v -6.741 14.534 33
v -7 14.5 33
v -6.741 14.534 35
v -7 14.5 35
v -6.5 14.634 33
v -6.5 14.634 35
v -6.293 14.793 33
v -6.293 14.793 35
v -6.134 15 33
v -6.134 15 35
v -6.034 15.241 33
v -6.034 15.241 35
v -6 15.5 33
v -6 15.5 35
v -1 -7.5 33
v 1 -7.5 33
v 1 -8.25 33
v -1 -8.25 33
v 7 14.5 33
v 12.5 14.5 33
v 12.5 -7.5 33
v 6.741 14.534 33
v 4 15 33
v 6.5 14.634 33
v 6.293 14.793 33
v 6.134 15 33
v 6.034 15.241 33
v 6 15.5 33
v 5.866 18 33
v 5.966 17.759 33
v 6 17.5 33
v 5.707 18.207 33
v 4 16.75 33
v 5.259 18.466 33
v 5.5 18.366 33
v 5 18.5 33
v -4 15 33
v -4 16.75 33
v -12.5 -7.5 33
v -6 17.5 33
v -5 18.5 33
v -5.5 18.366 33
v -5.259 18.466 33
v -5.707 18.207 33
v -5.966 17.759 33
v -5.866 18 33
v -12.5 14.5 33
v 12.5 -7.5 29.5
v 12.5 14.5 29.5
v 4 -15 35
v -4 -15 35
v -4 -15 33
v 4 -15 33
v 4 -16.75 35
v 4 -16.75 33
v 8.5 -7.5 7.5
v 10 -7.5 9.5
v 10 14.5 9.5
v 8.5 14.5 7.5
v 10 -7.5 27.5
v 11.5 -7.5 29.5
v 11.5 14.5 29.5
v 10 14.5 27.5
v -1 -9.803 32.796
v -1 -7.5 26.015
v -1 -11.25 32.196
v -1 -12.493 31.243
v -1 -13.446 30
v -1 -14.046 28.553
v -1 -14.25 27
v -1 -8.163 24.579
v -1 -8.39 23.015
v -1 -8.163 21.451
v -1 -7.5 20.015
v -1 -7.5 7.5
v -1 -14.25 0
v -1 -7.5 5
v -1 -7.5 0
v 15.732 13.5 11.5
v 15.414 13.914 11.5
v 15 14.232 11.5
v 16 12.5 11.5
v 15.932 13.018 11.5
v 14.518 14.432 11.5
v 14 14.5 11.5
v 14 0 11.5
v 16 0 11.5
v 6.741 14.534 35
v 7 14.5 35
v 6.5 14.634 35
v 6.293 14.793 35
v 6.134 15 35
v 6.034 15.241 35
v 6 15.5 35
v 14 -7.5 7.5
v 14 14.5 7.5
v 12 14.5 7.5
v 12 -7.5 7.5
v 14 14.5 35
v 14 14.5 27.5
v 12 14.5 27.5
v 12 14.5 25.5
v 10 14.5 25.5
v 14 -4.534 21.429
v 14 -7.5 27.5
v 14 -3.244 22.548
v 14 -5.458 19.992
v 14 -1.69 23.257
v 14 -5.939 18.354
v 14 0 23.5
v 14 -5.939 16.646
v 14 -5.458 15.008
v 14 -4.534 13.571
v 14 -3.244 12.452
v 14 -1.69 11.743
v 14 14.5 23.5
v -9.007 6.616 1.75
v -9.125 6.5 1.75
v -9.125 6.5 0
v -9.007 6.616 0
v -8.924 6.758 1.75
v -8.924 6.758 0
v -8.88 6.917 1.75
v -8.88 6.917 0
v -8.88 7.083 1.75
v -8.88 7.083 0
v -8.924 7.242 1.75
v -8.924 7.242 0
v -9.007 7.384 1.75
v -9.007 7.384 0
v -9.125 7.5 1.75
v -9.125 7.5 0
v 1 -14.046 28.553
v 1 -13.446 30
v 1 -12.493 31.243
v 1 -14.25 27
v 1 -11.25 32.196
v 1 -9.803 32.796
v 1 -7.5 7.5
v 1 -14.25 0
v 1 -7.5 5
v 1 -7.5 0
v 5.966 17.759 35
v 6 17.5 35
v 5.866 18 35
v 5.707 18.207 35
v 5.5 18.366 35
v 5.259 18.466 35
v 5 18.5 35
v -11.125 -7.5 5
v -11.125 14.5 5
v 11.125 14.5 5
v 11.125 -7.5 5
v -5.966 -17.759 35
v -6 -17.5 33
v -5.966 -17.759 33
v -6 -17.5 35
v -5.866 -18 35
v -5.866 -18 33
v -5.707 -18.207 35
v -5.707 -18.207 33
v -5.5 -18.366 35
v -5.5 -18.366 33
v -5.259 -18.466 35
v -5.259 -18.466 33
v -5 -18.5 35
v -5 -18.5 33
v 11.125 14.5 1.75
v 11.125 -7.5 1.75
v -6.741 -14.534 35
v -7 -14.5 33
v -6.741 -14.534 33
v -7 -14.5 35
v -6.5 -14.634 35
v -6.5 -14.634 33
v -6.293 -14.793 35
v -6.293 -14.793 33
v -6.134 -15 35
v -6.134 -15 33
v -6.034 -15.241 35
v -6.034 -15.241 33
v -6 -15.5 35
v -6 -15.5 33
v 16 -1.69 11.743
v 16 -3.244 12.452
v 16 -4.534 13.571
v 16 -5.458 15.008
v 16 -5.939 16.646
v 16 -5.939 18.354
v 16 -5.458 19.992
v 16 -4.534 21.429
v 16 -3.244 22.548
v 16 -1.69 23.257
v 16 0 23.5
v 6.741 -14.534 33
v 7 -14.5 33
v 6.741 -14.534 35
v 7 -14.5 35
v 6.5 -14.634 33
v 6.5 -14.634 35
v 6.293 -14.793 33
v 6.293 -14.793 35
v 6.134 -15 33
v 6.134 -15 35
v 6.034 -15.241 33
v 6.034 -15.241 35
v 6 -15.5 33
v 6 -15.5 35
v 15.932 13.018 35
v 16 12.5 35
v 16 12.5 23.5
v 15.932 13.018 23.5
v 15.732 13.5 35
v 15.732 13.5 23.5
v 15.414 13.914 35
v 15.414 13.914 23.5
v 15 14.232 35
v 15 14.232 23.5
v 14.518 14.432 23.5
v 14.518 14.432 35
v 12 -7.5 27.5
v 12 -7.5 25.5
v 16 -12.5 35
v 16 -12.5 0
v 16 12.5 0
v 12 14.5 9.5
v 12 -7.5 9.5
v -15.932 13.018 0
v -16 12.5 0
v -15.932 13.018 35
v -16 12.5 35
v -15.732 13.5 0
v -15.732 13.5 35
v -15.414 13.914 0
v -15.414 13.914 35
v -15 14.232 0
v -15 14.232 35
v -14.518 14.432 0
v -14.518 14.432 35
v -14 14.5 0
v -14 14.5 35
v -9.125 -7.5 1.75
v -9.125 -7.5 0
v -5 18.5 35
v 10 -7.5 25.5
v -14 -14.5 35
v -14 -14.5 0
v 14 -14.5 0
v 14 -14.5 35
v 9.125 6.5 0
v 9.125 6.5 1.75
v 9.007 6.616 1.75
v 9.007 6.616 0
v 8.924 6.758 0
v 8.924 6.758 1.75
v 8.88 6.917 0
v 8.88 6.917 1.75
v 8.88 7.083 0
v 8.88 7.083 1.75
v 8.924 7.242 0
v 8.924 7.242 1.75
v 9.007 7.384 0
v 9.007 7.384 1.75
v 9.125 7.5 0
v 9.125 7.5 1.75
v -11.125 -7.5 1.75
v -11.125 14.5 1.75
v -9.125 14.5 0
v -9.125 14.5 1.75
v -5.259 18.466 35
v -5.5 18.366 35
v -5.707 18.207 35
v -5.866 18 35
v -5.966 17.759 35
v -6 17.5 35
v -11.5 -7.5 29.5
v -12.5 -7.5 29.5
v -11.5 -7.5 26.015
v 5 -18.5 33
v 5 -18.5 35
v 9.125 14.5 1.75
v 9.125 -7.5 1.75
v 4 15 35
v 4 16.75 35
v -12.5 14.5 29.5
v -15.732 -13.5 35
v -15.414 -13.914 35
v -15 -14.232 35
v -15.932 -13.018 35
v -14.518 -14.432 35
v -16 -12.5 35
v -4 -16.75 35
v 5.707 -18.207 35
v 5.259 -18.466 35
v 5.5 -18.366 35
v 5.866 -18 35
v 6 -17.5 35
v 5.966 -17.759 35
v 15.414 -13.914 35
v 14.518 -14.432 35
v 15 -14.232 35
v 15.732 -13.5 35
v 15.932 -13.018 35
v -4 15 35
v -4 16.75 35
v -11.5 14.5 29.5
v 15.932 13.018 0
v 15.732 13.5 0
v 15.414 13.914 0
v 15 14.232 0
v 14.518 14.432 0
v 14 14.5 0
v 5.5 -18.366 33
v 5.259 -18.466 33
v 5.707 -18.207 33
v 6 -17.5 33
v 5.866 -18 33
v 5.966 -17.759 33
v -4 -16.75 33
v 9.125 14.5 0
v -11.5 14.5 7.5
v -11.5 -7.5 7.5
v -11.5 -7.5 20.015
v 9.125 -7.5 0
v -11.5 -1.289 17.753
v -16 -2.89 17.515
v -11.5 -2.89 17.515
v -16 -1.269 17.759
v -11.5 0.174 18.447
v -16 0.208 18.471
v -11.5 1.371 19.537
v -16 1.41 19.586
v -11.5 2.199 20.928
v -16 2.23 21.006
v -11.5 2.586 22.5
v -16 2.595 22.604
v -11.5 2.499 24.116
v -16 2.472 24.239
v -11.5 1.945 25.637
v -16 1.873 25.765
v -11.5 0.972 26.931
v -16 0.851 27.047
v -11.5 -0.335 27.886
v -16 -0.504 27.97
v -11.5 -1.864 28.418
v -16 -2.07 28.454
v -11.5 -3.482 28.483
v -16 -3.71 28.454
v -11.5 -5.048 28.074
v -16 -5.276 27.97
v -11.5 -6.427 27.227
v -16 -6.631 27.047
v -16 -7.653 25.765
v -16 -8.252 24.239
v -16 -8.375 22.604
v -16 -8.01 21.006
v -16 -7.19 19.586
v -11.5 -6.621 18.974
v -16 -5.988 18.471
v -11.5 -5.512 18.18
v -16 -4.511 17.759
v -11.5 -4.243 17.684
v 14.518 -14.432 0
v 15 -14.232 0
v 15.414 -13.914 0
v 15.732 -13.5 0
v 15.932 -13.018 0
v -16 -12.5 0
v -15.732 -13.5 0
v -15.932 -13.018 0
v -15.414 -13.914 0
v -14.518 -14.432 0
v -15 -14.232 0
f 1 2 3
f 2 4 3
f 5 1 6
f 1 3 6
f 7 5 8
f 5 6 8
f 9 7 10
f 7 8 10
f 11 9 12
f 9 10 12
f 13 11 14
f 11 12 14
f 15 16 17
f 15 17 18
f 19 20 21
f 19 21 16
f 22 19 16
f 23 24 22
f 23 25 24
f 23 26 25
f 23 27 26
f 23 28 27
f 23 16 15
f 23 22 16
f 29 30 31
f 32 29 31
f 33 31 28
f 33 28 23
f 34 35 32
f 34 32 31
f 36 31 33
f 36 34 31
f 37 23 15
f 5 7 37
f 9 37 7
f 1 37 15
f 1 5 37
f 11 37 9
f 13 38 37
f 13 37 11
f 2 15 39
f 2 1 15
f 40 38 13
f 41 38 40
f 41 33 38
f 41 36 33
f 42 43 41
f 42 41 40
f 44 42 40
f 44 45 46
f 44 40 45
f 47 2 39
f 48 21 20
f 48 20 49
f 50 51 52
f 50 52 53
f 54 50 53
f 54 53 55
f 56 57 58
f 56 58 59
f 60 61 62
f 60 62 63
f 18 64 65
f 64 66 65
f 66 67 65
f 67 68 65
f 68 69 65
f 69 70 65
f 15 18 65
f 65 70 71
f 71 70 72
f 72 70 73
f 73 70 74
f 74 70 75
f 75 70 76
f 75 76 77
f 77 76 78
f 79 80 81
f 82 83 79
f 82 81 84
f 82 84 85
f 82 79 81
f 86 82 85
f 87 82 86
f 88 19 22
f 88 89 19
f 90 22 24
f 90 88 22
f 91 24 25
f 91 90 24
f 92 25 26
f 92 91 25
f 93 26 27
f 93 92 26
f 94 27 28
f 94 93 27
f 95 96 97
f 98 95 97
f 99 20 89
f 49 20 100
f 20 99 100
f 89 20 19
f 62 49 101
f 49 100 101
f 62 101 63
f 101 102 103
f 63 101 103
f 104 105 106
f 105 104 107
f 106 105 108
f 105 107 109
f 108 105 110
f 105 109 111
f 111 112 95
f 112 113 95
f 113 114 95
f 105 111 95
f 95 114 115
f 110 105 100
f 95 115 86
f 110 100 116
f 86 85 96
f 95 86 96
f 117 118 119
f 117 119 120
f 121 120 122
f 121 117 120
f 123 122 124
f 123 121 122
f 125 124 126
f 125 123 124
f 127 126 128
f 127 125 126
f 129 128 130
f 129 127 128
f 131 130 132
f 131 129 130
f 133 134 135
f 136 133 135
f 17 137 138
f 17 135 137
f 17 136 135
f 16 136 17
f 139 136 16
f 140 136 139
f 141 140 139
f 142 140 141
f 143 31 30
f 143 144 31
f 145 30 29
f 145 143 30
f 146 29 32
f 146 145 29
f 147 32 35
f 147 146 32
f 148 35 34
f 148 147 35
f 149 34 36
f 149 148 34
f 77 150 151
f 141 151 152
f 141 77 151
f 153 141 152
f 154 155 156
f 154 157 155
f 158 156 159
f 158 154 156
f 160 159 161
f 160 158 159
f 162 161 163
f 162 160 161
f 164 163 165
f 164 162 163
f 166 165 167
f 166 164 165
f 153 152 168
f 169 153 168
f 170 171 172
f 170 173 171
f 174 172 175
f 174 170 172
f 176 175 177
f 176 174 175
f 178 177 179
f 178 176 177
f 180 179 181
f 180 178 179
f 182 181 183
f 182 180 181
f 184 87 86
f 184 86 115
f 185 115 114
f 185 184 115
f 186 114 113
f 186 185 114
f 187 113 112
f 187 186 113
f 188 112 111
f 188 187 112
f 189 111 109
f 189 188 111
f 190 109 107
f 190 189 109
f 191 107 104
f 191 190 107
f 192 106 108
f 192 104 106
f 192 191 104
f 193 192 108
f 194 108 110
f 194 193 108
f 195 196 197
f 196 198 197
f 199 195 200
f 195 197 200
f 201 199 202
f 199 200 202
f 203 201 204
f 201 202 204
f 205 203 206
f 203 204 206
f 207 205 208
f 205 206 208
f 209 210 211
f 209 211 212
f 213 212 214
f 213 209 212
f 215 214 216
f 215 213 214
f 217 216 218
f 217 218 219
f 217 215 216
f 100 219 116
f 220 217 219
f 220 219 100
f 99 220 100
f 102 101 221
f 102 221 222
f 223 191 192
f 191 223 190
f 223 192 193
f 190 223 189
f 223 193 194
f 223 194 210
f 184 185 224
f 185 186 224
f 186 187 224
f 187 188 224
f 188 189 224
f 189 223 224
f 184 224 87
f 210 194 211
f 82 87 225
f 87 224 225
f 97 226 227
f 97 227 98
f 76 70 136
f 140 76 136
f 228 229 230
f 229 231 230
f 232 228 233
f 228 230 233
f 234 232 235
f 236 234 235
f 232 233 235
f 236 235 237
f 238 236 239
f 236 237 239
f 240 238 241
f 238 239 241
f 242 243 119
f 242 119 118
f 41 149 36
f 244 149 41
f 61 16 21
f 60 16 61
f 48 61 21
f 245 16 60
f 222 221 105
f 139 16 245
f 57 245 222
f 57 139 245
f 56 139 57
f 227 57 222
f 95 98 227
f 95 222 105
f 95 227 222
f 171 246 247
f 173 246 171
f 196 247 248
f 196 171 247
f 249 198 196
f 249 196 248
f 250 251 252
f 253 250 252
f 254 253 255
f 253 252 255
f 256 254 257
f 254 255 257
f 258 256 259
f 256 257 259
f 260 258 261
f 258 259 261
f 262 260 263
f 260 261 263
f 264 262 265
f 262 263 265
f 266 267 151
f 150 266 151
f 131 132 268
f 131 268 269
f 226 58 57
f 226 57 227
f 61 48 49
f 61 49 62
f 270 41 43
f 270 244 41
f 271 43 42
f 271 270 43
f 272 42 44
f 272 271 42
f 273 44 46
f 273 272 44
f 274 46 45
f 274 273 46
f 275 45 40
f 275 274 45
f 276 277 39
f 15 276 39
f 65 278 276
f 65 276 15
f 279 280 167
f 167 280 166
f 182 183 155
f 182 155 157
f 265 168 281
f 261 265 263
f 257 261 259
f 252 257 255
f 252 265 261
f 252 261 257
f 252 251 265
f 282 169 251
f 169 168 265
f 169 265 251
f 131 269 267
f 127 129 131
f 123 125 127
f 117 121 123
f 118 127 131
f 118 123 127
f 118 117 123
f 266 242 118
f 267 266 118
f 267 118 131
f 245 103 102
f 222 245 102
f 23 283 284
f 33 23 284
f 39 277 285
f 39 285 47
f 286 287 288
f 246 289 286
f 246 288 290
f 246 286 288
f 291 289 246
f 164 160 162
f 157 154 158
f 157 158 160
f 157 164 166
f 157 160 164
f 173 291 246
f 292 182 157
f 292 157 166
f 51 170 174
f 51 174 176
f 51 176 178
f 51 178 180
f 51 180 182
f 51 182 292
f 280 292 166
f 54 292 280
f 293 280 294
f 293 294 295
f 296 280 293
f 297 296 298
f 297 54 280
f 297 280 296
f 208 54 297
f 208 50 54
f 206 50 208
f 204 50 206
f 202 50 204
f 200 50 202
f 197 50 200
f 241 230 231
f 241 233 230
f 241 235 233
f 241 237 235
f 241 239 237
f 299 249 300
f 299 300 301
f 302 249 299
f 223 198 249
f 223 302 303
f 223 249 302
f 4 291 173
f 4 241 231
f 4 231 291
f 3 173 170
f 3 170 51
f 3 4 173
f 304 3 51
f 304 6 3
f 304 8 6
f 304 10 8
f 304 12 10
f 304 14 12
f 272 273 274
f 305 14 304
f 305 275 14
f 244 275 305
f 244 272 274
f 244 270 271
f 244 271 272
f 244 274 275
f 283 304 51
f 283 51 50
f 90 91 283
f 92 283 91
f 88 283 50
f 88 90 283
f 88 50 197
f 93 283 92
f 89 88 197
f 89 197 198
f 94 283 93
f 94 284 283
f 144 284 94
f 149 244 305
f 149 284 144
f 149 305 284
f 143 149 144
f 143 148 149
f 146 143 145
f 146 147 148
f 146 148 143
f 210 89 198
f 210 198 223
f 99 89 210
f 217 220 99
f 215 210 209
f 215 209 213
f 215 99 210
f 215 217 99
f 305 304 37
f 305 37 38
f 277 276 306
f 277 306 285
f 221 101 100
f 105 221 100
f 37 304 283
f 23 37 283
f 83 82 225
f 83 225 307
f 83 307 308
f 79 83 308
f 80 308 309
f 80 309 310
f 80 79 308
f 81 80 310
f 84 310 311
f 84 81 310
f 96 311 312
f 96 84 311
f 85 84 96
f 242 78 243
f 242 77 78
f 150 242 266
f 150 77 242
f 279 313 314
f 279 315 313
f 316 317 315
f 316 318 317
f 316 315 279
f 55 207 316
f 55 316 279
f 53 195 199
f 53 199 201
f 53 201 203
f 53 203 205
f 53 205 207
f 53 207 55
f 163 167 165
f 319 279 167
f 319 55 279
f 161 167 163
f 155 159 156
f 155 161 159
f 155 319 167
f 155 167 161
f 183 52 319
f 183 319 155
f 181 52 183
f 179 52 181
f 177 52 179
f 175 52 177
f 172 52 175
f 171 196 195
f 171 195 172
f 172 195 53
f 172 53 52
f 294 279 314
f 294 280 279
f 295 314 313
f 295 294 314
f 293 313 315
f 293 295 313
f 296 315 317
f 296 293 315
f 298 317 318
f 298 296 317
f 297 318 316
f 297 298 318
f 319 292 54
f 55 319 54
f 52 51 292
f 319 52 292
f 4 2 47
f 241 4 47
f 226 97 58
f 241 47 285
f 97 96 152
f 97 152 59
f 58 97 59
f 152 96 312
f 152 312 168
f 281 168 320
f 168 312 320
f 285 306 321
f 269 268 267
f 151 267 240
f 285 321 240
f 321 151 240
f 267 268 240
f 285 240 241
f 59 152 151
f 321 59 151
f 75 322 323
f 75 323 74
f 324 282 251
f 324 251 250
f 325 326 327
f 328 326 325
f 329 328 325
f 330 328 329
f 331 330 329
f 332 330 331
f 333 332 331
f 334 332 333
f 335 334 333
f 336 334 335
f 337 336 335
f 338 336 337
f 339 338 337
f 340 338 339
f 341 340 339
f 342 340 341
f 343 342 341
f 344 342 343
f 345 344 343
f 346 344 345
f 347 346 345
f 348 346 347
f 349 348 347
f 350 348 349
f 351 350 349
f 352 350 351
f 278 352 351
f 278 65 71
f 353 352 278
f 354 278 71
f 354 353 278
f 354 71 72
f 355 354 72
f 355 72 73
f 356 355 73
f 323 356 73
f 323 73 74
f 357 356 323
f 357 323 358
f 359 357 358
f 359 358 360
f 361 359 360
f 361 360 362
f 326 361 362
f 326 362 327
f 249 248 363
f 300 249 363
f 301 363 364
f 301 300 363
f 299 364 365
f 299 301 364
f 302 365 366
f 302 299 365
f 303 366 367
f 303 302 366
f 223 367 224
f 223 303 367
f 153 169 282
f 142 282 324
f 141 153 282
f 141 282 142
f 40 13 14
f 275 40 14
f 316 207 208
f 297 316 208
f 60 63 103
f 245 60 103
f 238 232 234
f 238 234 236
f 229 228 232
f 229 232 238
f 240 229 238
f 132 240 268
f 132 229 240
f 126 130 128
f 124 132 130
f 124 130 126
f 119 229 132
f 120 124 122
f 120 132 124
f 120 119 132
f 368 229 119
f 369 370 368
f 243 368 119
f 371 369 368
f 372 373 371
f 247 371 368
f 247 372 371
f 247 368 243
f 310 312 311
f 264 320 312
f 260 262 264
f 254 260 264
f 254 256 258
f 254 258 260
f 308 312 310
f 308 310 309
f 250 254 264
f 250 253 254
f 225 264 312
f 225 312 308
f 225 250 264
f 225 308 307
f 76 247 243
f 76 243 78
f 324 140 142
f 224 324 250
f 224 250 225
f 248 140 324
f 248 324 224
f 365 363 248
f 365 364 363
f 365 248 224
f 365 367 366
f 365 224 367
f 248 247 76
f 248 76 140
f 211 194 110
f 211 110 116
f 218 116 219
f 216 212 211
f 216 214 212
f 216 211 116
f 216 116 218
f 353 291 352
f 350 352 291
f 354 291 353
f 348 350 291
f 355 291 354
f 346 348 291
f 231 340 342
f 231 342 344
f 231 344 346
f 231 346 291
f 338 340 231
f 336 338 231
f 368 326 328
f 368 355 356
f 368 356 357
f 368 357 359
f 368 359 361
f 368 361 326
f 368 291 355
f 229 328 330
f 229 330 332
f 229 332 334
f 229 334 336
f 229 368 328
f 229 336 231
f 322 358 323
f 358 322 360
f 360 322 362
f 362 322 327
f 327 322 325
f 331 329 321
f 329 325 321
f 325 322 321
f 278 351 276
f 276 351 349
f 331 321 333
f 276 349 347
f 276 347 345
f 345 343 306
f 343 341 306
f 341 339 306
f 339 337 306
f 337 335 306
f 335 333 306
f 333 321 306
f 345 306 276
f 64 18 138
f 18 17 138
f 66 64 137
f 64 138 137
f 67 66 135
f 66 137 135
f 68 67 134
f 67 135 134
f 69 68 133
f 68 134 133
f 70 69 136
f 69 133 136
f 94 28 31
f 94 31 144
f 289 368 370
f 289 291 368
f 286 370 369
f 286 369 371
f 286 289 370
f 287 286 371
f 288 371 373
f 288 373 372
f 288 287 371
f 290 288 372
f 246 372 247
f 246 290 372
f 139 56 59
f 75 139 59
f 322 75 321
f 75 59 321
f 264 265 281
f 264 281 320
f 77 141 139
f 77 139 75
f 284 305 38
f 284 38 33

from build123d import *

# Parameters (mm, degrees)
SKETCH1_W                         = 32
SKETCH1_H                         = 29
BOSS_EXTRUDE1_DEPTH               = 35
FILLET1_R                         = 2
SLOT_FOR_COIL_DEPTH               = 1
SLOT_FOR_COIL_DEPTH_BACK          = 30
BOSS_EXTRUDE2_DEPTH               = 7
BOSS_EXTRUDE3_DEPTH               = 1.75
SKETCH5_W                         = 2
SKETCH5_H                         = 7
SLOT_TO_FEED_IN_WIRE_DEPTH        = 33
SLOT_FO_PCB_DEPTH                 = 22
SKETCH7_W                         = 2
SKETCH7_H                         = 33
BOSS_EXTRUDE4_DEPTH               = 0.25
FILLET2_R                         = 6
ROD_MOUNT_SLOT_REACH              = 34
SKETCH14_W                        = 2.5
SKETCH14_H                        = 20
SIDE_CAVITY_FOR_MOUNT_PLATE_DEPTH = 22
SKETCH16_W                        = 2
SKETCH16_H                        = 2
SIDE_STOPS_FOR_MOUNT_PLATE_DEPTH  = 22
BOSS_EXTRUDE6_DEPTH               = 22
SKETCH21_W                        = 12
SKETCH21_H                        = 2
BOSS_EXTRUDE7_DEPTH               = 4
SKETCH23_W                        = 8
SKETCH23_H                        = 1.75
CUT_EXTRUDE7_DEPTH                = 2
FILLET3_R                         = 1
CUT_EXTRUDE8_REACH                = 34
SKETCH26_R                        = 5.5


with BuildPart() as part:
    # Sketch1 → Boss-Extrude1 (new body)
    with BuildSketch(Plane.XY):
        Rectangle(SKETCH1_W, SKETCH1_H)
    extrude(amount=BOSS_EXTRUDE1_DEPTH)

    # Fillet1
    fillet1_edges = [part.edges().sort_by_distance(p)[0] for p in [
        (16, -14.5, 17.5),
        (-16, -14.5, 17.5),
        (-16, 14.5, 17.5),
        (16, 14.5, 17.5),
    ]]
    fillet(fillet1_edges, radius=FILLET1_R)

    # Sketch2 → Slot for Coil (cut, two sides)
    with BuildSketch(Plane.XZ.offset(14.5)) as slot_for_coil_sk:
        Polygon((-9.125, 0), (-9.125, 1.75), (-11.125, 1.75), (-11.125, 5), (11.125, 5), (11.125, 1.75), (9.125, 1.75), (9.125, 0), align=None)
    extrude(amount=SLOT_FOR_COIL_DEPTH, mode=Mode.SUBTRACT)
    extrude(slot_for_coil_sk.sketch, amount=-SLOT_FOR_COIL_DEPTH_BACK, mode=Mode.SUBTRACT)

    # Sketch3 → Boss-Extrude2 (add)
    with BuildSketch(Plane.XZ.offset(14.5)):
        Polygon((-9.125, 0), (-9.125, 1.75), (-11.125, 1.75), (-11.125, 5), (11.125, 5), (11.125, 1.75), (9.125, 1.75), (9.125, 0), align=None)
    extrude(amount=-BOSS_EXTRUDE2_DEPTH)

    # Sketch4 → Boss-Extrude3 (add)
    with BuildSketch(Plane(origin=(0, 0, 1.75), x_dir=(-1, 0, 0), z_dir=(0, 0, -1))):
        with BuildLine():
            Line((-9.125, 7.5), (-9.125, 6.5))
            ThreePointArc((-9.125, 6.5), (-8.875, 7), (-9.125, 7.5))
        make_face()
    boss_extrude3 = extrude(amount=BOSS_EXTRUDE3_DEPTH)

    # Mirror1: Boss-Extrude3 across plane
    add(boss_extrude3.mirror(Plane(origin=(0, 0, 0), x_dir=(0, 0, 1), z_dir=(1, 0, 0))))

    # Sketch5 → slot to feed in wire (cut)
    with BuildSketch(Plane(origin=(0, 0, 0), x_dir=(-1, 0, 0), z_dir=(0, 0, -1))):
        with Locations((0, -11)):
            Rectangle(SKETCH5_W, SKETCH5_H)
    extrude(amount=-SLOT_TO_FEED_IN_WIRE_DEPTH, mode=Mode.SUBTRACT)

    # Sketch6 → slot fo PCB (cut)
    with BuildSketch(Plane(origin=(0, 14.5, 0), x_dir=(1, 0, 0), z_dir=(0, 1, 0))):
        Polygon((11.5, -7.5), (-11.5, -7.5), (-11.5, -29.5), (-12.5, -29.5), (-12.5, -33), (12.5, -33), (12.5, -29.5), (11.5, -29.5), align=None)
    extrude(amount=-SLOT_FO_PCB_DEPTH, mode=Mode.SUBTRACT)

    # Sketch7 → Boss-Extrude4 (add)
    with BuildSketch(Plane.XZ.offset(14.5)):
        with Locations((0, 16.5)):
            Rectangle(SKETCH7_W, SKETCH7_H)
    extrude(amount=-BOSS_EXTRUDE4_DEPTH)

    # Fillet2
    fillet2_edges = [part.edges().sort_by_distance(p)[0] for p in [
        (0, -14.25, 33),
    ]]
    fillet(fillet2_edges, radius=FILLET2_R)

    # Sketch11 → Rod Mount Slot (cut, up to next)
    with BuildSketch(Plane(origin=(16, 0, 44), x_dir=(0, 0, -1), z_dir=(1, 0, 0)), mode=Mode.PRIVATE) as rod_mount_slot_sk1:
        with BuildLine():
            Line((32.5, 25), (32.5, 0))
            ThreePointArc((32.5, 0), (26.5, -6), (20.5, 0))
            Line((20.5, 0), (20.5, 25))
            ThreePointArc((20.5, 25), (26.5, 31), (32.5, 25))
        make_face()
    rod_mount_slot_tool1 = extrude(rod_mount_slot_sk1.sketch, amount=-ROD_MOUNT_SLOT_REACH, mode=Mode.PRIVATE) & part.part
    add(rod_mount_slot_tool1.solids().sort_by_distance((16, 12.5, 17.5))[0], mode=Mode.SUBTRACT)

    # Sketch14 → Side cavity for mount plate (cut)
    with BuildSketch(Plane(origin=(0, 14.5, 0), x_dir=(1, 0, 0), z_dir=(0, 1, 0))):
        with Locations((12.75, -17.5)):
            Rectangle(SKETCH14_W, SKETCH14_H)
    extrude(amount=-SIDE_CAVITY_FOR_MOUNT_PLATE_DEPTH, mode=Mode.SUBTRACT)

    # Sketch16 → Side stops for mount plate (add)
    with BuildSketch(Plane(origin=(0, 14.5, 0), x_dir=(1, 0, 0), z_dir=(0, 1, 0))):
        with Locations((11, -8.5)):
            Rectangle(SKETCH16_W, SKETCH16_H)
        with Locations((11, -26.5)):
            Rectangle(SKETCH16_W, SKETCH16_H)
    extrude(amount=-SIDE_STOPS_FOR_MOUNT_PLATE_DEPTH)

    # Sketch20 → Boss-Extrude6 (add)
    with BuildSketch(Plane(origin=(0, 14.5, 0), x_dir=(1, 0, 0), z_dir=(0, 1, 0))):
        Polygon((11.5, -29.5), (10, -27.5), (11.5, -27.5), align=None)
        Polygon((10, -9.5), (8.5, -7.5), (10, -7.5), align=None)
    extrude(amount=-BOSS_EXTRUDE6_DEPTH)

    # Sketch21 → Boss-Extrude7 (add)
    with BuildSketch(Plane(origin=(0, 14.5, 0), x_dir=(-1, 0, 0), z_dir=(0, 1, 0))):
        with Locations((0, 34)):
            Rectangle(SKETCH21_W, SKETCH21_H)
    boss_extrude7 = extrude(amount=BOSS_EXTRUDE7_DEPTH)

    # Sketch23 → Cut-Extrude7 (cut)
    with BuildSketch(Plane.XY.offset(35)):
        with Locations((0, 15.875)):
            Rectangle(SKETCH23_W, SKETCH23_H)
    cut_extrude7 = extrude(amount=-CUT_EXTRUDE7_DEPTH, mode=Mode.SUBTRACT)

    # Mirror3: Boss-Extrude7, Cut-Extrude7 across plane
    add(boss_extrude7.mirror(Plane.ZX))
    add(cut_extrude7.mirror(Plane.ZX), mode=Mode.SUBTRACT)

    # Fillet3
    fillet3_edges = [part.edges().sort_by_distance(p)[0] for p in [
        (6, 14.5, 34),
        (-6, 14.5, 34),
        (6, 18.5, 34),
        (-6, 18.5, 34),
        (6, -18.5, 34),
        (-6, -18.5, 34),
        (6, -14.5, 34),
        (-6, -14.5, 34),
    ]]
    fillet(fillet3_edges, radius=FILLET3_R)

    # Sketch26 → Cut-Extrude8 (cut, up to next)
    with BuildSketch(Plane(origin=(-16, 0, 0), x_dir=(0, 0, -1), z_dir=(1, 0, 0)), mode=Mode.PRIVATE) as cut_extrude8_sk1:
        with Locations((-23.015, -2.89)):
            Circle(SKETCH26_R)
    cut_extrude8_tool1 = extrude(cut_extrude8_sk1.sketch, amount=CUT_EXTRUDE8_REACH, mode=Mode.PRIVATE) & part.part
    add(cut_extrude8_tool1.solids().sort_by_distance((-16, -2.89, 23.015))[0], mode=Mode.SUBTRACT)


solid = part.part
